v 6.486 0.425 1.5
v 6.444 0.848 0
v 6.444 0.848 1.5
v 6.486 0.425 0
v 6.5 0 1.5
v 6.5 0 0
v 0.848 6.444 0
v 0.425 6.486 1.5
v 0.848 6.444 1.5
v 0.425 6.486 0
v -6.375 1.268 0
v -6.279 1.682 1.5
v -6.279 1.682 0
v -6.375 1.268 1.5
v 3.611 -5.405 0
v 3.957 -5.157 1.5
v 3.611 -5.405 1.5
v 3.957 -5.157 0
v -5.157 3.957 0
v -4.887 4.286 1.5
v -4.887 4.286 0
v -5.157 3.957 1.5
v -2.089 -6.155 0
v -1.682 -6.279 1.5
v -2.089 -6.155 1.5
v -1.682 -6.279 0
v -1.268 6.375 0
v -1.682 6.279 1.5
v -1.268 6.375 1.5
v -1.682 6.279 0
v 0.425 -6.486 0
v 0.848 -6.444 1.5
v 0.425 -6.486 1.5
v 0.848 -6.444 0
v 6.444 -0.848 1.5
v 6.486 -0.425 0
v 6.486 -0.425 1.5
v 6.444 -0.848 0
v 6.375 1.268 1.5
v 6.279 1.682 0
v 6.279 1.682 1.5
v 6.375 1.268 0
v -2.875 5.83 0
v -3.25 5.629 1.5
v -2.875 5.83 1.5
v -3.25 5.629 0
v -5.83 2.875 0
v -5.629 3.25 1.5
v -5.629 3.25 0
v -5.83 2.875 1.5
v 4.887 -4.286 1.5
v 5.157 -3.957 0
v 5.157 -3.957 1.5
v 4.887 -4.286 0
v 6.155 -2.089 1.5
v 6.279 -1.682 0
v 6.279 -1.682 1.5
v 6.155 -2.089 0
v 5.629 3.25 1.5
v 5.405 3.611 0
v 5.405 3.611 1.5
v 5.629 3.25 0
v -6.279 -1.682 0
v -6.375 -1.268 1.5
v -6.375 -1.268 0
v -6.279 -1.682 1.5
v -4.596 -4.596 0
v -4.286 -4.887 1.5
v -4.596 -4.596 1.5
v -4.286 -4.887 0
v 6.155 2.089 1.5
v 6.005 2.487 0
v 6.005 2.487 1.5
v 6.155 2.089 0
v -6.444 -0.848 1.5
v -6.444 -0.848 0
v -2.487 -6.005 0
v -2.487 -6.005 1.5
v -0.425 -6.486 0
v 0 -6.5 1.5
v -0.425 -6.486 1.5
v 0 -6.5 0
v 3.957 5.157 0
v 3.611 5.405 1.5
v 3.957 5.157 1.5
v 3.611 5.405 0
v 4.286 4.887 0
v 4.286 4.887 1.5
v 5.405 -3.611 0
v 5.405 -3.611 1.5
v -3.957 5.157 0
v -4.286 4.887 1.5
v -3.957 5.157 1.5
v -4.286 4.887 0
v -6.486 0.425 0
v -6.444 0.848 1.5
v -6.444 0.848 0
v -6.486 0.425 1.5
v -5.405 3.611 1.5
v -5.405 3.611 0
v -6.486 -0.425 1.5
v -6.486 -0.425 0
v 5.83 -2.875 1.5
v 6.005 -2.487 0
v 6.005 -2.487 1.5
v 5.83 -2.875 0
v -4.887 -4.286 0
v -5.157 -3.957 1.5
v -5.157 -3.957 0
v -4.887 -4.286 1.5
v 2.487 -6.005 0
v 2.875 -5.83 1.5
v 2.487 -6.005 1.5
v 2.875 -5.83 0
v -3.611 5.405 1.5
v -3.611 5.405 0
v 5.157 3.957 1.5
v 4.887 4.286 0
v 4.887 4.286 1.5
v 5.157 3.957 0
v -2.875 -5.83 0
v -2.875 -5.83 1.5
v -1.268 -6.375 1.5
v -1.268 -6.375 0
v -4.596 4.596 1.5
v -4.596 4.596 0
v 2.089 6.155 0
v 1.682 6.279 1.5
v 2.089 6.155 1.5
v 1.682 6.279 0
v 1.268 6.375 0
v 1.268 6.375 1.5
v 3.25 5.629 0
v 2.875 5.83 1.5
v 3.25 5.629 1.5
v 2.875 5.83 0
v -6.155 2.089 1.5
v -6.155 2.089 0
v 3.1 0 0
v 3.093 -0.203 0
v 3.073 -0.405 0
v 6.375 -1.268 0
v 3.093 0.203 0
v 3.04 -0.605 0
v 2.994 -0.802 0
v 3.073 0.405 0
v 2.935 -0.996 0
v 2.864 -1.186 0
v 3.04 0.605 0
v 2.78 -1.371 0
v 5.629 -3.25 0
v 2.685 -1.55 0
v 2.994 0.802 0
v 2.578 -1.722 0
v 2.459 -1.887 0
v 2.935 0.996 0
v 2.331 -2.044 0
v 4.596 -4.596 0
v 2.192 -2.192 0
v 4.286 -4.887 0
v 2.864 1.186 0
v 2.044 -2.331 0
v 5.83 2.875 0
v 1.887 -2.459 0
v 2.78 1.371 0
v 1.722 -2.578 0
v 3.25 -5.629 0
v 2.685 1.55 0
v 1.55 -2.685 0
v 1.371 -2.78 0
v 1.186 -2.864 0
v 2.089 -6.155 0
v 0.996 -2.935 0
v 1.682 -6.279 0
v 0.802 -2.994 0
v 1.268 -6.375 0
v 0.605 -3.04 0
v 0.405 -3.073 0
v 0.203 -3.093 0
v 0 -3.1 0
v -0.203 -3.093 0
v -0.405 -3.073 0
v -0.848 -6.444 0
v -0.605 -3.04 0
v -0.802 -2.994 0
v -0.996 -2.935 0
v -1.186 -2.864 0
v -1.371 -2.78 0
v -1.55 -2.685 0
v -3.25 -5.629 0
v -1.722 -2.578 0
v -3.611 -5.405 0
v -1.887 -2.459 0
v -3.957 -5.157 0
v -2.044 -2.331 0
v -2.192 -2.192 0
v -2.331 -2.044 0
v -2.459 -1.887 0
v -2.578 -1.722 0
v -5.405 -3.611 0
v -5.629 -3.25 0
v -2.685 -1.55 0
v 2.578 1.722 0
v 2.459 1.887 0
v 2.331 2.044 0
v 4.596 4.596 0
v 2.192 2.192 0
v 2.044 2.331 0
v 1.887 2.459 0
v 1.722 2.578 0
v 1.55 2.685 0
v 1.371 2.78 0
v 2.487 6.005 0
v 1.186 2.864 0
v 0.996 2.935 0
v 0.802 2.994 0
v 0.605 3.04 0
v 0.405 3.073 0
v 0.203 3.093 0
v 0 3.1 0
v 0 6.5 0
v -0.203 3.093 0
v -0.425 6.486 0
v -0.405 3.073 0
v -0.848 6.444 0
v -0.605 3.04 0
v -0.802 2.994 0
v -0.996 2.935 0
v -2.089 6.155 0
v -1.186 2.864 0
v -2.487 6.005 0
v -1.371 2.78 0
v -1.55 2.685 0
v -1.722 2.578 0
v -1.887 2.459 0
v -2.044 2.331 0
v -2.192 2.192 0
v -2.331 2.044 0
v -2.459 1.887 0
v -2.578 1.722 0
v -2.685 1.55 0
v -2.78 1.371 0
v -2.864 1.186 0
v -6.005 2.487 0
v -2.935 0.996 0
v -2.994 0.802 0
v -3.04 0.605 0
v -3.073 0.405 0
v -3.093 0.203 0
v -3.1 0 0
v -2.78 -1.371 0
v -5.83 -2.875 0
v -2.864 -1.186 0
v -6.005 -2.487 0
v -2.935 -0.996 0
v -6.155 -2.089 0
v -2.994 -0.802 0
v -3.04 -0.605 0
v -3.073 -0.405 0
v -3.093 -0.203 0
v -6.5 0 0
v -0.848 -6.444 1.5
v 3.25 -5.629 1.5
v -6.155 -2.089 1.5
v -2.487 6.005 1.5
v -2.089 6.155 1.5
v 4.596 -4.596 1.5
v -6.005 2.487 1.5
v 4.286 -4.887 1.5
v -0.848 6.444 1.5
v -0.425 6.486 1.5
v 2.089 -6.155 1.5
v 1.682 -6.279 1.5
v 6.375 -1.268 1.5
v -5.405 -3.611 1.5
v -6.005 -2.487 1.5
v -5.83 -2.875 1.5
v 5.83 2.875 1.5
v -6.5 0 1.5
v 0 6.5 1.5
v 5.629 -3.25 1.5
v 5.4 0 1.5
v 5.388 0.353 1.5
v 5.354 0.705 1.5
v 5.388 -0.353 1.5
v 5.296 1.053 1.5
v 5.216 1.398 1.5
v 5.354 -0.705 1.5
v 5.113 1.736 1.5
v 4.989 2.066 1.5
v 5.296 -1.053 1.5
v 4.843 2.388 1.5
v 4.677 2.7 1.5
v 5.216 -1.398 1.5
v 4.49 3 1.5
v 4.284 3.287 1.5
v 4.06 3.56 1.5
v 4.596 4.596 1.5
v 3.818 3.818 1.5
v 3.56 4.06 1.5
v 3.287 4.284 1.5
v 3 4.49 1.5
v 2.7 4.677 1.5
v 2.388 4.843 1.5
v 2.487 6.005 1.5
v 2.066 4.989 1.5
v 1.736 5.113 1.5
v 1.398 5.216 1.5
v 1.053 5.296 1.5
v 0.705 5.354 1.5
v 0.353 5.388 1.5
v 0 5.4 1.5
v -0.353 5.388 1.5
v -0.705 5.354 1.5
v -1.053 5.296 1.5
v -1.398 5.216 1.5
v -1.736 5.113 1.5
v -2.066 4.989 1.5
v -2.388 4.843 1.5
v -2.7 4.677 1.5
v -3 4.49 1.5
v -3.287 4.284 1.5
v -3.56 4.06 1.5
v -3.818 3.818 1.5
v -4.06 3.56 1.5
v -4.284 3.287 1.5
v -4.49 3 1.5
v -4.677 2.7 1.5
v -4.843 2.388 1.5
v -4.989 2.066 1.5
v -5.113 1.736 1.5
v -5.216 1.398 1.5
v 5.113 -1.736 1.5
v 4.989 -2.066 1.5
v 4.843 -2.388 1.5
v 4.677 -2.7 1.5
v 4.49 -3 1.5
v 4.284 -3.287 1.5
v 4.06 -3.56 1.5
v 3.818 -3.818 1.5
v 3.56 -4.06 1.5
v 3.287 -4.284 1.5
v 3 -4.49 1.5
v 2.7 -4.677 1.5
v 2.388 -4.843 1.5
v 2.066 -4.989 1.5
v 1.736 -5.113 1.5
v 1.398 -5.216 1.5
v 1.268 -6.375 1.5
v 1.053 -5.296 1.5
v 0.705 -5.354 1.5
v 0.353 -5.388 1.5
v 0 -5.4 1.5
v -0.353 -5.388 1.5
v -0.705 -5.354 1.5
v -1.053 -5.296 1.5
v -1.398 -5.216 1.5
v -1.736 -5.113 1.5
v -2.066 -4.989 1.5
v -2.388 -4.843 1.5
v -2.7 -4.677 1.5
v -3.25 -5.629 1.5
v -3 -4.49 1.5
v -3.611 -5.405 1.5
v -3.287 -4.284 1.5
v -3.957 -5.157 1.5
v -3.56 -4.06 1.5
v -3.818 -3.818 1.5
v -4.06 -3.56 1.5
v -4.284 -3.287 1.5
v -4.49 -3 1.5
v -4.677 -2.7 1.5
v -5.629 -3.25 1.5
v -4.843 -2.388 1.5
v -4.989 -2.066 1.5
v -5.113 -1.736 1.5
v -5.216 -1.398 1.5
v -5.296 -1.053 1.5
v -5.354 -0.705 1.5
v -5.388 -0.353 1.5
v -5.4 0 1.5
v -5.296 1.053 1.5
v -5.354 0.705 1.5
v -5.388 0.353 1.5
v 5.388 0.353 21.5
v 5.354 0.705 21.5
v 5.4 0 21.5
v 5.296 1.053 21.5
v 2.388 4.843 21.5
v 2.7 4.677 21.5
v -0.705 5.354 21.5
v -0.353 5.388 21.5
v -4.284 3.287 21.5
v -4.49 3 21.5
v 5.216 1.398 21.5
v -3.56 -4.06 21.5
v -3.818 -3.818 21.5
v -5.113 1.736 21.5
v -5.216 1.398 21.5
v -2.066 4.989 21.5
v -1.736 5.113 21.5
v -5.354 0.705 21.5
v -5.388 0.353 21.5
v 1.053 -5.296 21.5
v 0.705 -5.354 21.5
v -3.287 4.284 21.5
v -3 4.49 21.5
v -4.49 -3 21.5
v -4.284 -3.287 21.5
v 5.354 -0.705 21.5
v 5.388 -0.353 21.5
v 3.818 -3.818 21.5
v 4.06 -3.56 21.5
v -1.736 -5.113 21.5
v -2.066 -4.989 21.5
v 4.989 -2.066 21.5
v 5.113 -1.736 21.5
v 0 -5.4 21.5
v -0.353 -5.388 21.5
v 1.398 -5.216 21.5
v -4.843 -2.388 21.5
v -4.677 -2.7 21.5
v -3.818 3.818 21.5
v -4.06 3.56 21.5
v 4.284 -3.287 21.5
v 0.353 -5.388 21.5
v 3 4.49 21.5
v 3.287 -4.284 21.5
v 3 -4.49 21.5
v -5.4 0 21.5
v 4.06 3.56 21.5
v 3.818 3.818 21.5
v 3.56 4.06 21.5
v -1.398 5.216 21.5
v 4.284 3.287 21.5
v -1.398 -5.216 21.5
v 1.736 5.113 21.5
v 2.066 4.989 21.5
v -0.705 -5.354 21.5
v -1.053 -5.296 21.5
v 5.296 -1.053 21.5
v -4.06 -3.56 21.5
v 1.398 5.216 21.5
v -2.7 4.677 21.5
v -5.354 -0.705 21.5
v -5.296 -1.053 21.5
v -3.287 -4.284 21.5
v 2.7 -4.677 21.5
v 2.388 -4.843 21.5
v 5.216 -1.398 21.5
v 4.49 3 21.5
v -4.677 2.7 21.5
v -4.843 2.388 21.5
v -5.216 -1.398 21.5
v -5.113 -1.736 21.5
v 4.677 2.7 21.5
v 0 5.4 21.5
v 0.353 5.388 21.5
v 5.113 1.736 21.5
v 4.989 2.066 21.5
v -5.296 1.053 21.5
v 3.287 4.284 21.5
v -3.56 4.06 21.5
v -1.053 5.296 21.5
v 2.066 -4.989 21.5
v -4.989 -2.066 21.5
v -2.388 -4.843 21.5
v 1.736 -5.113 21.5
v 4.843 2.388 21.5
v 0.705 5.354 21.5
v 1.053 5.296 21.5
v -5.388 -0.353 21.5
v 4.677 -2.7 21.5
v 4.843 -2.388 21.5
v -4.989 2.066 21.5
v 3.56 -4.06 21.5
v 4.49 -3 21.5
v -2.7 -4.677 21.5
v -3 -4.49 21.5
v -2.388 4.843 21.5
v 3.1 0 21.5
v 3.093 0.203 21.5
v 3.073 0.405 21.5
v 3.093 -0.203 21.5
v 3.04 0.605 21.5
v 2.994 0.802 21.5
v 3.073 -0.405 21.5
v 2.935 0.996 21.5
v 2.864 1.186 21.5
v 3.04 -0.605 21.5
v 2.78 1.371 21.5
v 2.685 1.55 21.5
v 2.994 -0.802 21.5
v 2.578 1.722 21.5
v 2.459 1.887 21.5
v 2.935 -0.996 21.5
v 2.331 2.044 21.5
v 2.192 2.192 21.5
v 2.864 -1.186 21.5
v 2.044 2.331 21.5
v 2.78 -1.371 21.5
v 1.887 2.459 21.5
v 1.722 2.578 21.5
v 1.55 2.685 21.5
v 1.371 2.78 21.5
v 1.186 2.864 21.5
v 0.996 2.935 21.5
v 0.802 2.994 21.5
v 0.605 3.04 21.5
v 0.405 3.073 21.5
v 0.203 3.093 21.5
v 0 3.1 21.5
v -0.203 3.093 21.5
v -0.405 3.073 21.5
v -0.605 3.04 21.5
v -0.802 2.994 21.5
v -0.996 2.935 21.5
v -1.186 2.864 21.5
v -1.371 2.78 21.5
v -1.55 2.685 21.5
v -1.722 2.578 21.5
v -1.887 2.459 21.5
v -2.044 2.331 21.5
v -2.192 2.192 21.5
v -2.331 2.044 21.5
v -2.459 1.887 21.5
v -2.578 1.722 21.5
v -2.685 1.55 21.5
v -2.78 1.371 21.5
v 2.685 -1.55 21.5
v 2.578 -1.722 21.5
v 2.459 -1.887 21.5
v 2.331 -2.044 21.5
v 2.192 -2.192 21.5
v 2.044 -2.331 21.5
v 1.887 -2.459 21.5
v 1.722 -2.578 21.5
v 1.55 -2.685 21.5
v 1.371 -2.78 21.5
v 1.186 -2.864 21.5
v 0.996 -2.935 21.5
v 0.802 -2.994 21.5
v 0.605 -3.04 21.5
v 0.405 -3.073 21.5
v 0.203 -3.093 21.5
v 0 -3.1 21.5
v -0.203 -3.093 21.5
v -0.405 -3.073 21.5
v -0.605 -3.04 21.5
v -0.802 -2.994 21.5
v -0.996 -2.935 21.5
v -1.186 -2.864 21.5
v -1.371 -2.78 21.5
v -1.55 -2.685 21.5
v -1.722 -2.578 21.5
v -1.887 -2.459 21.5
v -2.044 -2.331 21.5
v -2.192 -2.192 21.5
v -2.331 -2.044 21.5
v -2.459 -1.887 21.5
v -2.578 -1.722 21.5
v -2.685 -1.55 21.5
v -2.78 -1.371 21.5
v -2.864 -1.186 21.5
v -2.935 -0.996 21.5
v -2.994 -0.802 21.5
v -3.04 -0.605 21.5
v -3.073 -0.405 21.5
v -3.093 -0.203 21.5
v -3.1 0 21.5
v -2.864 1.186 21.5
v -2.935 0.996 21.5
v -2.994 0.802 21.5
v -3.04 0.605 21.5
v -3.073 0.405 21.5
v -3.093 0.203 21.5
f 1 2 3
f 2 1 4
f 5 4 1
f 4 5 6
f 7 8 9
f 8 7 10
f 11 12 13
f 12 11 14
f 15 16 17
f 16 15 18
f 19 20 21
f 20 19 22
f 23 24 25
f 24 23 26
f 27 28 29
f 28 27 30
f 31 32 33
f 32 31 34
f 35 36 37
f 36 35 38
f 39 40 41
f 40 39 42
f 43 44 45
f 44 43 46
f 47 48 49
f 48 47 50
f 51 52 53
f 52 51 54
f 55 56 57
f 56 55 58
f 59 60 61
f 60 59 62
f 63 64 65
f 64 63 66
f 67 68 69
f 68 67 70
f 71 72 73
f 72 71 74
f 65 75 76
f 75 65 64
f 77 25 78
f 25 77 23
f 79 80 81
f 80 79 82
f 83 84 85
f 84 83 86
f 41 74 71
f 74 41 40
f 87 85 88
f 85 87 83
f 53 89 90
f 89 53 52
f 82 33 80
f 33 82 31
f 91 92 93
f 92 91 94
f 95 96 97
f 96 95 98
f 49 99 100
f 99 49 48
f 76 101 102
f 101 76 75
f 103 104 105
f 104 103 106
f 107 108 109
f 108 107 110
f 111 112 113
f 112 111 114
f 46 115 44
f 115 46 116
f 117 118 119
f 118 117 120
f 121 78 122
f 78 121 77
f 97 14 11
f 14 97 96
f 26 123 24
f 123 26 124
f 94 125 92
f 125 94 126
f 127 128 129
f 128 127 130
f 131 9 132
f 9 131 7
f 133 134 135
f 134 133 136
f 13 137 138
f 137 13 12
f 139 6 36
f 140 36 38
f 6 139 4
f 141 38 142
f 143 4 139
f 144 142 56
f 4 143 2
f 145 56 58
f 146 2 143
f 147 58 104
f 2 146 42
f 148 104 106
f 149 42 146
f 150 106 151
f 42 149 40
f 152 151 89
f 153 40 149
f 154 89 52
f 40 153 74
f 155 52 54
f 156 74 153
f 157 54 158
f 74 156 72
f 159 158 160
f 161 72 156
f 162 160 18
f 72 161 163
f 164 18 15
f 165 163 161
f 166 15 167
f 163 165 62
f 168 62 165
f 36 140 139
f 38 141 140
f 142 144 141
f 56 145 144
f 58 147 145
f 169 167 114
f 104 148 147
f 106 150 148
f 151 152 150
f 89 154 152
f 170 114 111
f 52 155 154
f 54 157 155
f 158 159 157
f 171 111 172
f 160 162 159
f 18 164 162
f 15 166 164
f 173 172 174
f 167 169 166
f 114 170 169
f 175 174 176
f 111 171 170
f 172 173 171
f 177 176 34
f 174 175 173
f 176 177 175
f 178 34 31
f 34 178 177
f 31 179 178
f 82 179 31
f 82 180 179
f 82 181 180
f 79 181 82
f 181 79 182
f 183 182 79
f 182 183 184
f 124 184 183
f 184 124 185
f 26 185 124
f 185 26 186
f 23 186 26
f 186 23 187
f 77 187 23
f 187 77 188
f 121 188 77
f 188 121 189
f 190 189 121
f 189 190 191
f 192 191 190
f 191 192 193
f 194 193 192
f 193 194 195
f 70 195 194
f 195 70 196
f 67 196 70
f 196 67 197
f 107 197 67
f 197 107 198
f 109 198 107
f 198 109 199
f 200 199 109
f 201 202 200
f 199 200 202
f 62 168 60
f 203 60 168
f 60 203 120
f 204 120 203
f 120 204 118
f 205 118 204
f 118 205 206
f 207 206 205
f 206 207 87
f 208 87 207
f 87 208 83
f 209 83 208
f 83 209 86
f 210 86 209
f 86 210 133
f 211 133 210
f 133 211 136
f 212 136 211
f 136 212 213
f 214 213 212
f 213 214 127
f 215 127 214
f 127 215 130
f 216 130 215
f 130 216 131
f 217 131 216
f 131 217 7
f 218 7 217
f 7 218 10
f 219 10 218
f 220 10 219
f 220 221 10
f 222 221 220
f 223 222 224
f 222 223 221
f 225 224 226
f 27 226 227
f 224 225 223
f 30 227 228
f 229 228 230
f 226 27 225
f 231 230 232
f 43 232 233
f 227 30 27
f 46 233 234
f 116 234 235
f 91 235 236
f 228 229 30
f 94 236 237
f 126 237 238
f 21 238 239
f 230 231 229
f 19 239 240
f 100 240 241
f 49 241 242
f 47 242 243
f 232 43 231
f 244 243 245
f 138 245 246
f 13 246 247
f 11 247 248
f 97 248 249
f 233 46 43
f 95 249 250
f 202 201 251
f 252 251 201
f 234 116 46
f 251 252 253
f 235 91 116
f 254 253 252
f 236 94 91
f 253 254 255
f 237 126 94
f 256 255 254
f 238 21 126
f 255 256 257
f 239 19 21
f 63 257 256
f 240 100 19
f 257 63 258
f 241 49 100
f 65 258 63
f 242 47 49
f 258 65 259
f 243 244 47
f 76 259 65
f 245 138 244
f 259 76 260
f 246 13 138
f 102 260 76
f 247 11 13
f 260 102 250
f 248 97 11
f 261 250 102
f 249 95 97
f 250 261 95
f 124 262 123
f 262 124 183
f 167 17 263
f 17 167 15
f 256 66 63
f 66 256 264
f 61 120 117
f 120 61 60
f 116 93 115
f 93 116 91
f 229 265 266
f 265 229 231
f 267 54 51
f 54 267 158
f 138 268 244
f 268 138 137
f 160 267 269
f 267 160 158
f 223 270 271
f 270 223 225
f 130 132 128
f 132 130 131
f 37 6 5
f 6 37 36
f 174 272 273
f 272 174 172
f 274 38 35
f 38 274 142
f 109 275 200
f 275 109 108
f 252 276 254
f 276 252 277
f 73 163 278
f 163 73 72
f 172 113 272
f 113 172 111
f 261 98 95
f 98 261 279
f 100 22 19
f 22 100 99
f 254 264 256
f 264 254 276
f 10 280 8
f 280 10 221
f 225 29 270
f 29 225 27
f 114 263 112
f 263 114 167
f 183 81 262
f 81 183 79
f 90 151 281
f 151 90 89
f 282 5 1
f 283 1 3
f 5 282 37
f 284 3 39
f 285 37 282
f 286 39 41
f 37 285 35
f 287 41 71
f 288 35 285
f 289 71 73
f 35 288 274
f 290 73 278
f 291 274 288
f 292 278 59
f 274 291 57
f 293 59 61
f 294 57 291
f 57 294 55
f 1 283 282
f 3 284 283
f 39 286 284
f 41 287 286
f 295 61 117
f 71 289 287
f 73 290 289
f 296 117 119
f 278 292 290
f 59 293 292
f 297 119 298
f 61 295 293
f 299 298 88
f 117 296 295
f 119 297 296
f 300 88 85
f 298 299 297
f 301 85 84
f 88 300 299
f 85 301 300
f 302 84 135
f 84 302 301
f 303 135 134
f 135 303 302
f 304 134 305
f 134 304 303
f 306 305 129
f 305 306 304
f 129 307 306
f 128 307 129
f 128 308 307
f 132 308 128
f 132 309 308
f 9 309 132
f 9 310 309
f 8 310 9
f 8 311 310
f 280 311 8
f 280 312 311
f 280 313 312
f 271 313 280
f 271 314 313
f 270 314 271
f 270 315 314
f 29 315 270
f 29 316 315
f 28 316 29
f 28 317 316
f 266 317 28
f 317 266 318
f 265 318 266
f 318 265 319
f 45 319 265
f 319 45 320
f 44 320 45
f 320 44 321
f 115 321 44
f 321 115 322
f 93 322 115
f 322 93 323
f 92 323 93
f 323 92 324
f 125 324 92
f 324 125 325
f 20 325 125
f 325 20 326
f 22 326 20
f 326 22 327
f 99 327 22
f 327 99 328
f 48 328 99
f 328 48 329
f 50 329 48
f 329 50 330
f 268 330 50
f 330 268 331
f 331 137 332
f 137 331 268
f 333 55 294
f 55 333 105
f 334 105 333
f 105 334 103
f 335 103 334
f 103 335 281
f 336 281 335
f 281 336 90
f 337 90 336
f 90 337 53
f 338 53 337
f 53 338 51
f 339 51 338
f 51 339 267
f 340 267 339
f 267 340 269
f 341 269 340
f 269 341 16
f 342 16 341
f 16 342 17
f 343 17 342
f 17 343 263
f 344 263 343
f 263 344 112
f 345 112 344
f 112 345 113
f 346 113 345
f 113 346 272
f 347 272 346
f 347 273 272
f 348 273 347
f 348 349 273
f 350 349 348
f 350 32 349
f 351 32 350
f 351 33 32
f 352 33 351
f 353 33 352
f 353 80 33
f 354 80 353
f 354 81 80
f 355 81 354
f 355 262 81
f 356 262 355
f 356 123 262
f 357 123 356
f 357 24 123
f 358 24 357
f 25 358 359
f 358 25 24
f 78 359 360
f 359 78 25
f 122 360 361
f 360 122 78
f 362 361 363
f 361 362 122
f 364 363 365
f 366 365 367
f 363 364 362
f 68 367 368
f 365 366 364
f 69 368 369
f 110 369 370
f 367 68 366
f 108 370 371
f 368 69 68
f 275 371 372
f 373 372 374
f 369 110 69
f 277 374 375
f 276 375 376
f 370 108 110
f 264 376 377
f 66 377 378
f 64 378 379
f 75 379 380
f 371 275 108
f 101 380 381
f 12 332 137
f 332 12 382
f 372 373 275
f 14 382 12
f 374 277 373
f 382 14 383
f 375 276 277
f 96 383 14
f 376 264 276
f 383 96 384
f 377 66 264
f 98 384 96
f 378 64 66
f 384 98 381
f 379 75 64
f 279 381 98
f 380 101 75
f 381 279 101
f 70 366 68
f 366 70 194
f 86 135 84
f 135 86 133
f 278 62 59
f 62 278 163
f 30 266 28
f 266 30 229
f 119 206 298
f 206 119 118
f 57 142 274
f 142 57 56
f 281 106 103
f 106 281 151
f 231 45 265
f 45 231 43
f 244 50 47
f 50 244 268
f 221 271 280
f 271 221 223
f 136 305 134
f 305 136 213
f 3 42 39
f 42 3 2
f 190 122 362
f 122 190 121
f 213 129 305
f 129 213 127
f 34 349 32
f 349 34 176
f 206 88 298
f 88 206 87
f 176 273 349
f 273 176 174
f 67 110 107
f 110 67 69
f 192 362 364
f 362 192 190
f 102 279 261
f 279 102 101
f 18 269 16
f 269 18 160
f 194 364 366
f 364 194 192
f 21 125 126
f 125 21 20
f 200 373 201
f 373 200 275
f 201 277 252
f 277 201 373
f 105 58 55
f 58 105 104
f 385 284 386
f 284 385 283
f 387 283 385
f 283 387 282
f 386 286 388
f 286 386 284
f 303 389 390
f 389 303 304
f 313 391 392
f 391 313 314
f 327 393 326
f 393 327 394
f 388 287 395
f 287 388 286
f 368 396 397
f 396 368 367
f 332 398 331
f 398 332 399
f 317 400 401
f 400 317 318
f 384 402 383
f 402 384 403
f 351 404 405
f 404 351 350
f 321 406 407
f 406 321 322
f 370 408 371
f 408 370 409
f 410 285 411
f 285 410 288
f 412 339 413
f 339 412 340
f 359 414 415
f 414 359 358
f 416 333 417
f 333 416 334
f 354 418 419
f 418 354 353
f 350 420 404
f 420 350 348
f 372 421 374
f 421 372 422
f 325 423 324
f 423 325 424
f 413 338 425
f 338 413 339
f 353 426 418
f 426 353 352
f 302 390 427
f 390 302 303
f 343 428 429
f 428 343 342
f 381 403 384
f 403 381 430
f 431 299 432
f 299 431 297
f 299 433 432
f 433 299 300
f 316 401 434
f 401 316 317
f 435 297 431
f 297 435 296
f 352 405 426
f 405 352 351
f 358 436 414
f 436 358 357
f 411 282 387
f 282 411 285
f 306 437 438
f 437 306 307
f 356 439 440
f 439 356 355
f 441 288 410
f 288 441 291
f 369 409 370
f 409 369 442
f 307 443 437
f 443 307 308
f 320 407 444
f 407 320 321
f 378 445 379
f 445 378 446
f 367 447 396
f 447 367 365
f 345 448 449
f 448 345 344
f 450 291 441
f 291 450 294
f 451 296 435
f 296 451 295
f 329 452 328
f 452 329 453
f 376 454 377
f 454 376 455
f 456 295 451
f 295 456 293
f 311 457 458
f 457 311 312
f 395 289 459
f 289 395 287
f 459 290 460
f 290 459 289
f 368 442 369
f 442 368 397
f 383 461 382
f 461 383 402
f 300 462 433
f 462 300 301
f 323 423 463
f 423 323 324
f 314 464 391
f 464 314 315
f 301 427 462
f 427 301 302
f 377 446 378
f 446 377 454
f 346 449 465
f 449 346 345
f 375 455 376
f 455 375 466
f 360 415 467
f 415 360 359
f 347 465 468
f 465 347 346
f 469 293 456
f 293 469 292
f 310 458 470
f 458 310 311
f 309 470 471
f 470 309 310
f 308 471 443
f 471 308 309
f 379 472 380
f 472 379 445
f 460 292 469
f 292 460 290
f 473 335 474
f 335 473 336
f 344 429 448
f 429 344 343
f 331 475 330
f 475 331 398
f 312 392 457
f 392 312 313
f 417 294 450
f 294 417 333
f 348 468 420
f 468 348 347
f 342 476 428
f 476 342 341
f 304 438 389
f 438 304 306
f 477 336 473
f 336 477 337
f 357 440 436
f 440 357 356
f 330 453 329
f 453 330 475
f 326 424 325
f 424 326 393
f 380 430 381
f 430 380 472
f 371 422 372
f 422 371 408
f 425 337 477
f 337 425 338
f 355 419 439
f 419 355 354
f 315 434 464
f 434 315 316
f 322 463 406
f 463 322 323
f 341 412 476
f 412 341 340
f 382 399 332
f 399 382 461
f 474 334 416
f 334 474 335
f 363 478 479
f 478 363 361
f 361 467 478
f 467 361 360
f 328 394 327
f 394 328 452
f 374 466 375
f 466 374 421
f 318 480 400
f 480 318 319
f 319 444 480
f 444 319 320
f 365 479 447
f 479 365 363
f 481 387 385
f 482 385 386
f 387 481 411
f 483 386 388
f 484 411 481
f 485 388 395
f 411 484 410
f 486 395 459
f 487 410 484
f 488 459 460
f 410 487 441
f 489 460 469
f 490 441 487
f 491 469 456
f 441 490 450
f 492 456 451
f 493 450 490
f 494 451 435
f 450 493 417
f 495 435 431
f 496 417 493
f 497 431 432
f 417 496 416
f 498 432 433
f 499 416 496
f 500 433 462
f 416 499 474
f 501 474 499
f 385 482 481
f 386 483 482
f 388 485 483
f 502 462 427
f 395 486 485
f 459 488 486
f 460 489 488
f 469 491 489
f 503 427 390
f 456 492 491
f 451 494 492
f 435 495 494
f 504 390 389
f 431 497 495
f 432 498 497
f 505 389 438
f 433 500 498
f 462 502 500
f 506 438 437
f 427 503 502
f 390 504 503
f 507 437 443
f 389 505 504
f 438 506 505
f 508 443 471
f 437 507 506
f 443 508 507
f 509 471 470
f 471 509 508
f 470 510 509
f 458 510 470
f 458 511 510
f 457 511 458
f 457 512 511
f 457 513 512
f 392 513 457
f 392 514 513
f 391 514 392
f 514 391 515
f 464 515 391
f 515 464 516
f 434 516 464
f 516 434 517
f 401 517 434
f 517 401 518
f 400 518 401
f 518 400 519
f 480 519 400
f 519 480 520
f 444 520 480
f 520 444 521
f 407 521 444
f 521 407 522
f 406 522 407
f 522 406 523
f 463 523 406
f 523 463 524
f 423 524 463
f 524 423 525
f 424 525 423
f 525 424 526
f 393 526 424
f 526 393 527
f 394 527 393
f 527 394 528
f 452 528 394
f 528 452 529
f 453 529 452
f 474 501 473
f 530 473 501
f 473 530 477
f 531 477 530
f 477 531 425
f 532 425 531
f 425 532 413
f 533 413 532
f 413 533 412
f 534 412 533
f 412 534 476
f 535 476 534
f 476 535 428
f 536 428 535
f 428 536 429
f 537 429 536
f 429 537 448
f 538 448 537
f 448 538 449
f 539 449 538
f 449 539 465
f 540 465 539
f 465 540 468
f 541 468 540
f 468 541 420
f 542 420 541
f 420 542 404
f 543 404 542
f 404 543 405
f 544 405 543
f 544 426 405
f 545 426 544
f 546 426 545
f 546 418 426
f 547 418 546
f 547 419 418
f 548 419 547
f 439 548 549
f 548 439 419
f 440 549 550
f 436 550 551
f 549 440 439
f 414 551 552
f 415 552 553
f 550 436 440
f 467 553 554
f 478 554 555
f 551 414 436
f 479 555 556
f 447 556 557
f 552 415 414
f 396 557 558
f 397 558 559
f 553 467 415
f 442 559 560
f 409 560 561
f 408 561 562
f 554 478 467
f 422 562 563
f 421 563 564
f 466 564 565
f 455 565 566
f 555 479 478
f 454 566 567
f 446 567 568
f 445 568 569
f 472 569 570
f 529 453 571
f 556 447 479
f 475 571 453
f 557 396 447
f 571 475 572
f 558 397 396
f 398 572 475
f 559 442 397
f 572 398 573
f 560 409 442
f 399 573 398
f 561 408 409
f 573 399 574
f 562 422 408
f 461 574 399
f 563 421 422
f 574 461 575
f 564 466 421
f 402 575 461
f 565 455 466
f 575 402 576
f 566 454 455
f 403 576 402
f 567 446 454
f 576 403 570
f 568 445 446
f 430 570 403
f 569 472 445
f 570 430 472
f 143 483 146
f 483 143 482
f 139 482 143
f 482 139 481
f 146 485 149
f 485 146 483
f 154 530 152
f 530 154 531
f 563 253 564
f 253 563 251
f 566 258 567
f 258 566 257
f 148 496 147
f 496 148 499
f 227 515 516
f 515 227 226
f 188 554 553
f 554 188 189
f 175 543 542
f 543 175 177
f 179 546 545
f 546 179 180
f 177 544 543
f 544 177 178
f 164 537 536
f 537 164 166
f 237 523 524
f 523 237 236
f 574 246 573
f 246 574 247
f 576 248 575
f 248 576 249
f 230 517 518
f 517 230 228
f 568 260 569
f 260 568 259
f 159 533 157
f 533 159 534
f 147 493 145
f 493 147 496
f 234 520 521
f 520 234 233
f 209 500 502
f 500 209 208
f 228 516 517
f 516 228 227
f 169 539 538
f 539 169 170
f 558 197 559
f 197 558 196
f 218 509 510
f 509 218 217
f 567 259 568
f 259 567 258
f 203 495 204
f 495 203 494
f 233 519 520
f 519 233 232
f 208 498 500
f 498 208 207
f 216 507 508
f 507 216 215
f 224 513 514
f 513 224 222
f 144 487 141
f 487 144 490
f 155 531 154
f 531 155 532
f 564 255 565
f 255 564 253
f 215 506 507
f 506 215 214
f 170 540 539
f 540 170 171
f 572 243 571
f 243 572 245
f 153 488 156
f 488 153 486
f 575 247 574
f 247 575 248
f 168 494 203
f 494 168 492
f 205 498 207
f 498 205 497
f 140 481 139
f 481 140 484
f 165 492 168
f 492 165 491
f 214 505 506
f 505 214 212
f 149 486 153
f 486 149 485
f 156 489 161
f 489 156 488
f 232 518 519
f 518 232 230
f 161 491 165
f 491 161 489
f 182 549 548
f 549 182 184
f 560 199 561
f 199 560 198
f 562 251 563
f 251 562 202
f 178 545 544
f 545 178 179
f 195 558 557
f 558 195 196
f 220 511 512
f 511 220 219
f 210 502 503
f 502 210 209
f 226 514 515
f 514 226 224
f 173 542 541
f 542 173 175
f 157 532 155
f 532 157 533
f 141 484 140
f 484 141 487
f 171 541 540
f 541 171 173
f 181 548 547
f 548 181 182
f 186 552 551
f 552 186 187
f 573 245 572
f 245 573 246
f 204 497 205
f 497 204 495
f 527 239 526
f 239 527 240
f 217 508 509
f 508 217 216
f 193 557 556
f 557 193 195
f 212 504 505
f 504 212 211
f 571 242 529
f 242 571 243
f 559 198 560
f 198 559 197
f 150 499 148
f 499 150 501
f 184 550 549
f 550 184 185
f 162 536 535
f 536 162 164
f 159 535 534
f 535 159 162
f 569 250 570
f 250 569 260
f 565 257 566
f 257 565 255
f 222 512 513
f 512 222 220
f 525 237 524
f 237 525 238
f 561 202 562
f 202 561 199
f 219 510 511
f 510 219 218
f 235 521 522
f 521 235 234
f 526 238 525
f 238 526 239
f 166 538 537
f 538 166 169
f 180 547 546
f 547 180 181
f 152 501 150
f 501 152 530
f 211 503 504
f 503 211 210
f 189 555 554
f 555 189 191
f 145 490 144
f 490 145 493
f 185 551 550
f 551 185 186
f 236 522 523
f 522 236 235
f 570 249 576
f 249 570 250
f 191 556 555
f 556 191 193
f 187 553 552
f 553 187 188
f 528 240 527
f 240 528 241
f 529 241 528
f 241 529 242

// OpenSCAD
// PCR tube adapter sleeve: fits in a 1.5 mL rack hole, holds a 0.2 mL tube
// Print orientation: collar on the bed (z = 0), sleeve body rises to z = 21.5

$fn = 96;

// ---- Dimensions (mm) ----
collar_d      = 13;    // collar outer diameter
collar_h      = 1.5;   // collar thickness (z = 0 to 1.5)
sleeve_od     = 10.8;  // sleeve body outer diameter
sleeve_top_z  = 21.5;  // top of sleeve body (absolute Z)
bore_d        = 6.2;   // through-bore diameter
eps           = 0.5;   // cutter overshoot past faces

total_h = sleeve_top_z; // overall height (21.5)

difference() {
    union() {
        // Collar
        cylinder(d = collar_d, h = collar_h);
        // Sleeve body (overlaps slightly into collar for a clean union)
        translate([0, 0, collar_h - 0.01])
            cylinder(d = sleeve_od, h = total_h - collar_h + 0.01);
    }
    // Through-bore
    translate([0, 0, -eps])
        cylinder(d = bore_d, h = total_h + 2 * eps);
}
